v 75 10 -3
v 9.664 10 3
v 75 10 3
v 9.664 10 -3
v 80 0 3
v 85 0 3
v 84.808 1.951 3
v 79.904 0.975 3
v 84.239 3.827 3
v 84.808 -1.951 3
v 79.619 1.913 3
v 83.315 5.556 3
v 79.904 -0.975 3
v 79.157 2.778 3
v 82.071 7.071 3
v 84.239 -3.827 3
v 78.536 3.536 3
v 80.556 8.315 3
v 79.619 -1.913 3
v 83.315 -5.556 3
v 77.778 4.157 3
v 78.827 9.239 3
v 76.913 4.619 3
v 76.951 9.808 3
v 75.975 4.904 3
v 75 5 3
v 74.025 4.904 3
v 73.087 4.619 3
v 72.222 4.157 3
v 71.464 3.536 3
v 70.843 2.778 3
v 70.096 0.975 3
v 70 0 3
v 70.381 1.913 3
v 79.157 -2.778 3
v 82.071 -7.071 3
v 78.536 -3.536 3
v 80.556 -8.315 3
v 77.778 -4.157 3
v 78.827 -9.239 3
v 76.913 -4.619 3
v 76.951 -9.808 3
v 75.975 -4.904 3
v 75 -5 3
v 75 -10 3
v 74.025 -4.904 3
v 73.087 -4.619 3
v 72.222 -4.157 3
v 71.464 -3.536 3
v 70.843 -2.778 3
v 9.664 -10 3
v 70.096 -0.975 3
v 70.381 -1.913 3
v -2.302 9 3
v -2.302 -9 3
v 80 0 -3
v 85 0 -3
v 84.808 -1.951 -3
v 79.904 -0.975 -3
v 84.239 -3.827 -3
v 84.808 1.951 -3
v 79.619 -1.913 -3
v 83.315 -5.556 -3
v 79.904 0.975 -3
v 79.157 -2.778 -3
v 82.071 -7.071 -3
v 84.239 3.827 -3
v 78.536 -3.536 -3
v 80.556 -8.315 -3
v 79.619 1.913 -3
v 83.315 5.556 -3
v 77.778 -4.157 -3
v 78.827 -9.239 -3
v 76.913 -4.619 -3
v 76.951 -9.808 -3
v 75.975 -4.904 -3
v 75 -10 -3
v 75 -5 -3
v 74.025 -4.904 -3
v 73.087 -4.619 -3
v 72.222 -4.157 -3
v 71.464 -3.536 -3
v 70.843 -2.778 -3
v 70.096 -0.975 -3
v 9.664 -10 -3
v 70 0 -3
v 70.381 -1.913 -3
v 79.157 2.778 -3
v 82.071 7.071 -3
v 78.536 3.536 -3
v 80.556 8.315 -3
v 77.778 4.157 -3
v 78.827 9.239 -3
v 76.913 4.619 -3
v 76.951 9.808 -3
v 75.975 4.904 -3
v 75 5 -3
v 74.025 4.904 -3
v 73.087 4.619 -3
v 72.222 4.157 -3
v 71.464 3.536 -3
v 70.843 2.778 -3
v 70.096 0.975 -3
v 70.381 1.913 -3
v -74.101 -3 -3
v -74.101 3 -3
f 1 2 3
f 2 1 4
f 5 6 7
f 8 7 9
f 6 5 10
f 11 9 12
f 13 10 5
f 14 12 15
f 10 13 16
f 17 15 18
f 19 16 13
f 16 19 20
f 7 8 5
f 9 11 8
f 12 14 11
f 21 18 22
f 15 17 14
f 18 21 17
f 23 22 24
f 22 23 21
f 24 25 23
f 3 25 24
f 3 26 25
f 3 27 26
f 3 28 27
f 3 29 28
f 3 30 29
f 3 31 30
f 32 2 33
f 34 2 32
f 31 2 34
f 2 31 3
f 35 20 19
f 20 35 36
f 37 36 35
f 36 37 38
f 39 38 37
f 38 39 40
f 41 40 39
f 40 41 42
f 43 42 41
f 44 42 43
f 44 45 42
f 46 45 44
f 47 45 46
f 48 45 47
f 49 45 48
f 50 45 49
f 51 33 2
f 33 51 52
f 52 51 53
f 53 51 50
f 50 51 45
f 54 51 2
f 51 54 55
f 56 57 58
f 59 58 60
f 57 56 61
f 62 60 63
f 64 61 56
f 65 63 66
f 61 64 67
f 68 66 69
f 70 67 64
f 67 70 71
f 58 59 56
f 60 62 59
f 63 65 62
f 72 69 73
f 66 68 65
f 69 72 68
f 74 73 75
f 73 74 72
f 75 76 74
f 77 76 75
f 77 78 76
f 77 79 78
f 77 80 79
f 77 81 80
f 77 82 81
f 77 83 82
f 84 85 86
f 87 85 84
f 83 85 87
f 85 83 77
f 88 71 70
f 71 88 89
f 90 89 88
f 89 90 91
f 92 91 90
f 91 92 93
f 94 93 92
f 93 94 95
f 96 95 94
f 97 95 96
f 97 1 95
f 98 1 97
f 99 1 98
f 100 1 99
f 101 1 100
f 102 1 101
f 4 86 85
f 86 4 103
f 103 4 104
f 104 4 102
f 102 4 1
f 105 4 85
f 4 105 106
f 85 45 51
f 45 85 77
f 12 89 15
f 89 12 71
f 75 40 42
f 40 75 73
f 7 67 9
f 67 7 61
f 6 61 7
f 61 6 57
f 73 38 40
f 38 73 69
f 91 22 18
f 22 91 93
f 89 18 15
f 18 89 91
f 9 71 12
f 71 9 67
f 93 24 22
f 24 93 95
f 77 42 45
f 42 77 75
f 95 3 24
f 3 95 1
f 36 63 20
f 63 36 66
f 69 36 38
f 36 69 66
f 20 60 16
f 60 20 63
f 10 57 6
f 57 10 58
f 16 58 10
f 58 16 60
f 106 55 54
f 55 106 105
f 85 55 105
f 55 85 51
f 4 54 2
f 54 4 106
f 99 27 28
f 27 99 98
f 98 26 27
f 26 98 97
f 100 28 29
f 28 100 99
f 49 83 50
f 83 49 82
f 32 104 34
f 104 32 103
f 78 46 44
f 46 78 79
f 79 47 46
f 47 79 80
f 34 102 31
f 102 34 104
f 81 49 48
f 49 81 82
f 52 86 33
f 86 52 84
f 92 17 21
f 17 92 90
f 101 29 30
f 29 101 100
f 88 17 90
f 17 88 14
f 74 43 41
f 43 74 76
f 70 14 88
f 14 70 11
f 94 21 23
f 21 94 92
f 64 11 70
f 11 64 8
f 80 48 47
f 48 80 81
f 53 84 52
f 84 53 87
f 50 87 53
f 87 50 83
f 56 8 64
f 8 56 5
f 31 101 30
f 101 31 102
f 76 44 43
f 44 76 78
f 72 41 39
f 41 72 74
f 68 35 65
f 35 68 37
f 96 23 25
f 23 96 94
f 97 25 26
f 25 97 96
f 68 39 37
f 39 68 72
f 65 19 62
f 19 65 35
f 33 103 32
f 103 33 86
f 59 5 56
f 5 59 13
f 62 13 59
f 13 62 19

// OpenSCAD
//Customizable panel pry tool
//Alex Tanchoco (LionAlex)
//Dec 14,2013

handle_length = 200;
handle_width = 20;
handle_thickness = 6;

rotate( [0,0,90] ) 
{
	difference() {
	intersection() {


		translate( [0,0,-handle_thickness] )
			rotate( [90,0,0] )
				rotate( [0,0,45] )
					cylinder( h=handle_length+handle_width, r2=handle_width+handle_thickness, r1=0, $fn=4, center=true );
			base_shape();

		}
		translate( [0,-handle_length*0.375,0] )
				cylinder( h=handle_thickness, r=handle_width/4, $fn=32, center=true );
	}
}

module base_shape() {
			cube( [handle_width,handle_length*0.75,handle_thickness],center=true );
			translate( [0,-handle_length*0.375,0] )
				cylinder( h=handle_thickness, r=handle_width/2, $fn=32, center=true );
		}
